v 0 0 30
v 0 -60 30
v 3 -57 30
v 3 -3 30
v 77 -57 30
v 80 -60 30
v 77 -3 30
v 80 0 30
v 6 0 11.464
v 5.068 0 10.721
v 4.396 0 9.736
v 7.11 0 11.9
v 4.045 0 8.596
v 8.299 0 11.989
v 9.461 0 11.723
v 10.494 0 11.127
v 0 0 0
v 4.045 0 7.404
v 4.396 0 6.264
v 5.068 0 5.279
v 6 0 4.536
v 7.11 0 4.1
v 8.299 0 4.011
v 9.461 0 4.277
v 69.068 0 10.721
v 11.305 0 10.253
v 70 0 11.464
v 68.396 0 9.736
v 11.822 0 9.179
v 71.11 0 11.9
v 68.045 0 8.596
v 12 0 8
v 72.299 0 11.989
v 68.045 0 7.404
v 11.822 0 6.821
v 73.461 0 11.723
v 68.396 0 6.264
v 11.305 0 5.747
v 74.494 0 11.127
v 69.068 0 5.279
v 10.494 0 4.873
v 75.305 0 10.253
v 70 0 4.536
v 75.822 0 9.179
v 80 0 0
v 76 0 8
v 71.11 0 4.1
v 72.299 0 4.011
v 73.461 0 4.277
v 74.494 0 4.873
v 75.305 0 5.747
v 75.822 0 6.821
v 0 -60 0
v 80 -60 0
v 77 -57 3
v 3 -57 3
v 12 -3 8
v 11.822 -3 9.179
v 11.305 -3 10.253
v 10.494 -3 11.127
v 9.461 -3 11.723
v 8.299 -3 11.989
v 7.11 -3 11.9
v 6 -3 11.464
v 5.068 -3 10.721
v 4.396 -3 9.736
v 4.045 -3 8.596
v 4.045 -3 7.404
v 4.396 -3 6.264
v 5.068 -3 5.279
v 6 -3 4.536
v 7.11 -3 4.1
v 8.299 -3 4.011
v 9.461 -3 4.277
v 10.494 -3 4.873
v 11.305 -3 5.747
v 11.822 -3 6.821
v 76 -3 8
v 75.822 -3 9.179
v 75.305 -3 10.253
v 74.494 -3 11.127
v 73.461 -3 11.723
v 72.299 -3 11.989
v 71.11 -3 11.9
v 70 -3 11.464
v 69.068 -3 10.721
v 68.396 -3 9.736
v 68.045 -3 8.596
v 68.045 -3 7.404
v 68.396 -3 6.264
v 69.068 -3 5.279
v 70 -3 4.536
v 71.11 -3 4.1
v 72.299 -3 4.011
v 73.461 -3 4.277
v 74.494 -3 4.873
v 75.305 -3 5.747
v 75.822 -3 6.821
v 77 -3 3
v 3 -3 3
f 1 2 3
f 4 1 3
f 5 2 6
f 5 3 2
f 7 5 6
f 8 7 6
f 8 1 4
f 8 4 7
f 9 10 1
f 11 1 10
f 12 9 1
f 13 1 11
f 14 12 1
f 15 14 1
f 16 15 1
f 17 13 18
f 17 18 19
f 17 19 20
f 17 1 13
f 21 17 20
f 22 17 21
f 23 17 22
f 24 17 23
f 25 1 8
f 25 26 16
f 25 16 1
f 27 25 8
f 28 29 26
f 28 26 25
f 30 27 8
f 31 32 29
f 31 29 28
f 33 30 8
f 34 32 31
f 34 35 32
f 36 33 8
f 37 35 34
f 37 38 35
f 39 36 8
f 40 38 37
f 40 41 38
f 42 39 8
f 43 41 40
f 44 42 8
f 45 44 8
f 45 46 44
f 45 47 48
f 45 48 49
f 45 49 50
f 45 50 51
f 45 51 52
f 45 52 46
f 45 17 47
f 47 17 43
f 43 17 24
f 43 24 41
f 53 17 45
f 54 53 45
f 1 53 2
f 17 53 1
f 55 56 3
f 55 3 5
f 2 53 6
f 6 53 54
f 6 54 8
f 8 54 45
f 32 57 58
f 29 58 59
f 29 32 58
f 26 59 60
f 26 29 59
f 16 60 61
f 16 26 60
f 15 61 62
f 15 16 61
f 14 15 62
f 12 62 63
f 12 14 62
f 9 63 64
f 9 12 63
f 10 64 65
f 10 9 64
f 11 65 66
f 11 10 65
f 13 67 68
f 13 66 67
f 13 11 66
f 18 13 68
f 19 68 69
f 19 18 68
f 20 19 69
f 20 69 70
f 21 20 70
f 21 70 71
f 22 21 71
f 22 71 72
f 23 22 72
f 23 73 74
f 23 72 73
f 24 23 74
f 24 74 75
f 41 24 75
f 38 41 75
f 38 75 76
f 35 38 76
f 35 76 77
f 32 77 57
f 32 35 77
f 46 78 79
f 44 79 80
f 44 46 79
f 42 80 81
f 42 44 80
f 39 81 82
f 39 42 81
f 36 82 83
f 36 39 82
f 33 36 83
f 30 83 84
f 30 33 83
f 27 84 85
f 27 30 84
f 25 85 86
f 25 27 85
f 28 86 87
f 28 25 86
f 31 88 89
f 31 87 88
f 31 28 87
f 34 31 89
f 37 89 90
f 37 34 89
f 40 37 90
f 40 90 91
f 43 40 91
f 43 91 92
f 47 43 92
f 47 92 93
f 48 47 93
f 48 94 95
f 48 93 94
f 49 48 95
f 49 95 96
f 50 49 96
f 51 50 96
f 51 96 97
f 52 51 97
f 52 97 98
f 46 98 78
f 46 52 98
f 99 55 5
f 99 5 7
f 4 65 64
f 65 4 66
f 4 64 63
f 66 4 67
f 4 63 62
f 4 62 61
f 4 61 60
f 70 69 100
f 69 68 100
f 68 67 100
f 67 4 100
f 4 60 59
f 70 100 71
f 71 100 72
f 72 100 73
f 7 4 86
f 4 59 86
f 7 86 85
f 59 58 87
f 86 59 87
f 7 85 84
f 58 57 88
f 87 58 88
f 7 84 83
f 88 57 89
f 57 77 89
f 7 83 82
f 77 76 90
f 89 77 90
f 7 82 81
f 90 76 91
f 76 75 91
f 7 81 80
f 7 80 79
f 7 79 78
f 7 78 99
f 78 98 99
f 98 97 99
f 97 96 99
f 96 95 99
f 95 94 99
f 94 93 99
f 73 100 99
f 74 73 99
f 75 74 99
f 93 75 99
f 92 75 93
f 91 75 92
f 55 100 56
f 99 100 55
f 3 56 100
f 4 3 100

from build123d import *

# Parameters (mm, degrees)
F0_W     = 74
F0_H     = 54
F1_DEPTH = 3
F0_W_2   = 80
F0_H_2   = 60
F2_DEPTH = 30
F3_R     = 4
F4_DEPTH = 5


with BuildPart() as f1:
    # F0 (on Top) → F1 (new body)
    with BuildSketch(Plane.XY):
        with Locations((40, -30)):
            Rectangle(F0_W, F0_H)
    extrude(amount=F1_DEPTH)

    # F0 (on Top) → F2 (join)
    with BuildSketch(Plane.XY):
        with Locations((40, -30)):
            Rectangle(F0_W_2, F0_H_2)
        with Locations((40, -30)):
            Rectangle(F0_W, F0_H, mode=Mode.SUBTRACT)
    extrude(amount=F2_DEPTH)

    # F3 (on Front) → F4 (cut)
    with BuildSketch(Plane.XZ):
        with Locations((72, 8)):
            Circle(F3_R)
        with Locations((8, 8)):
            Circle(F3_R)
    extrude(amount=F4_DEPTH, mode=Mode.SUBTRACT)


solid = f1.part
